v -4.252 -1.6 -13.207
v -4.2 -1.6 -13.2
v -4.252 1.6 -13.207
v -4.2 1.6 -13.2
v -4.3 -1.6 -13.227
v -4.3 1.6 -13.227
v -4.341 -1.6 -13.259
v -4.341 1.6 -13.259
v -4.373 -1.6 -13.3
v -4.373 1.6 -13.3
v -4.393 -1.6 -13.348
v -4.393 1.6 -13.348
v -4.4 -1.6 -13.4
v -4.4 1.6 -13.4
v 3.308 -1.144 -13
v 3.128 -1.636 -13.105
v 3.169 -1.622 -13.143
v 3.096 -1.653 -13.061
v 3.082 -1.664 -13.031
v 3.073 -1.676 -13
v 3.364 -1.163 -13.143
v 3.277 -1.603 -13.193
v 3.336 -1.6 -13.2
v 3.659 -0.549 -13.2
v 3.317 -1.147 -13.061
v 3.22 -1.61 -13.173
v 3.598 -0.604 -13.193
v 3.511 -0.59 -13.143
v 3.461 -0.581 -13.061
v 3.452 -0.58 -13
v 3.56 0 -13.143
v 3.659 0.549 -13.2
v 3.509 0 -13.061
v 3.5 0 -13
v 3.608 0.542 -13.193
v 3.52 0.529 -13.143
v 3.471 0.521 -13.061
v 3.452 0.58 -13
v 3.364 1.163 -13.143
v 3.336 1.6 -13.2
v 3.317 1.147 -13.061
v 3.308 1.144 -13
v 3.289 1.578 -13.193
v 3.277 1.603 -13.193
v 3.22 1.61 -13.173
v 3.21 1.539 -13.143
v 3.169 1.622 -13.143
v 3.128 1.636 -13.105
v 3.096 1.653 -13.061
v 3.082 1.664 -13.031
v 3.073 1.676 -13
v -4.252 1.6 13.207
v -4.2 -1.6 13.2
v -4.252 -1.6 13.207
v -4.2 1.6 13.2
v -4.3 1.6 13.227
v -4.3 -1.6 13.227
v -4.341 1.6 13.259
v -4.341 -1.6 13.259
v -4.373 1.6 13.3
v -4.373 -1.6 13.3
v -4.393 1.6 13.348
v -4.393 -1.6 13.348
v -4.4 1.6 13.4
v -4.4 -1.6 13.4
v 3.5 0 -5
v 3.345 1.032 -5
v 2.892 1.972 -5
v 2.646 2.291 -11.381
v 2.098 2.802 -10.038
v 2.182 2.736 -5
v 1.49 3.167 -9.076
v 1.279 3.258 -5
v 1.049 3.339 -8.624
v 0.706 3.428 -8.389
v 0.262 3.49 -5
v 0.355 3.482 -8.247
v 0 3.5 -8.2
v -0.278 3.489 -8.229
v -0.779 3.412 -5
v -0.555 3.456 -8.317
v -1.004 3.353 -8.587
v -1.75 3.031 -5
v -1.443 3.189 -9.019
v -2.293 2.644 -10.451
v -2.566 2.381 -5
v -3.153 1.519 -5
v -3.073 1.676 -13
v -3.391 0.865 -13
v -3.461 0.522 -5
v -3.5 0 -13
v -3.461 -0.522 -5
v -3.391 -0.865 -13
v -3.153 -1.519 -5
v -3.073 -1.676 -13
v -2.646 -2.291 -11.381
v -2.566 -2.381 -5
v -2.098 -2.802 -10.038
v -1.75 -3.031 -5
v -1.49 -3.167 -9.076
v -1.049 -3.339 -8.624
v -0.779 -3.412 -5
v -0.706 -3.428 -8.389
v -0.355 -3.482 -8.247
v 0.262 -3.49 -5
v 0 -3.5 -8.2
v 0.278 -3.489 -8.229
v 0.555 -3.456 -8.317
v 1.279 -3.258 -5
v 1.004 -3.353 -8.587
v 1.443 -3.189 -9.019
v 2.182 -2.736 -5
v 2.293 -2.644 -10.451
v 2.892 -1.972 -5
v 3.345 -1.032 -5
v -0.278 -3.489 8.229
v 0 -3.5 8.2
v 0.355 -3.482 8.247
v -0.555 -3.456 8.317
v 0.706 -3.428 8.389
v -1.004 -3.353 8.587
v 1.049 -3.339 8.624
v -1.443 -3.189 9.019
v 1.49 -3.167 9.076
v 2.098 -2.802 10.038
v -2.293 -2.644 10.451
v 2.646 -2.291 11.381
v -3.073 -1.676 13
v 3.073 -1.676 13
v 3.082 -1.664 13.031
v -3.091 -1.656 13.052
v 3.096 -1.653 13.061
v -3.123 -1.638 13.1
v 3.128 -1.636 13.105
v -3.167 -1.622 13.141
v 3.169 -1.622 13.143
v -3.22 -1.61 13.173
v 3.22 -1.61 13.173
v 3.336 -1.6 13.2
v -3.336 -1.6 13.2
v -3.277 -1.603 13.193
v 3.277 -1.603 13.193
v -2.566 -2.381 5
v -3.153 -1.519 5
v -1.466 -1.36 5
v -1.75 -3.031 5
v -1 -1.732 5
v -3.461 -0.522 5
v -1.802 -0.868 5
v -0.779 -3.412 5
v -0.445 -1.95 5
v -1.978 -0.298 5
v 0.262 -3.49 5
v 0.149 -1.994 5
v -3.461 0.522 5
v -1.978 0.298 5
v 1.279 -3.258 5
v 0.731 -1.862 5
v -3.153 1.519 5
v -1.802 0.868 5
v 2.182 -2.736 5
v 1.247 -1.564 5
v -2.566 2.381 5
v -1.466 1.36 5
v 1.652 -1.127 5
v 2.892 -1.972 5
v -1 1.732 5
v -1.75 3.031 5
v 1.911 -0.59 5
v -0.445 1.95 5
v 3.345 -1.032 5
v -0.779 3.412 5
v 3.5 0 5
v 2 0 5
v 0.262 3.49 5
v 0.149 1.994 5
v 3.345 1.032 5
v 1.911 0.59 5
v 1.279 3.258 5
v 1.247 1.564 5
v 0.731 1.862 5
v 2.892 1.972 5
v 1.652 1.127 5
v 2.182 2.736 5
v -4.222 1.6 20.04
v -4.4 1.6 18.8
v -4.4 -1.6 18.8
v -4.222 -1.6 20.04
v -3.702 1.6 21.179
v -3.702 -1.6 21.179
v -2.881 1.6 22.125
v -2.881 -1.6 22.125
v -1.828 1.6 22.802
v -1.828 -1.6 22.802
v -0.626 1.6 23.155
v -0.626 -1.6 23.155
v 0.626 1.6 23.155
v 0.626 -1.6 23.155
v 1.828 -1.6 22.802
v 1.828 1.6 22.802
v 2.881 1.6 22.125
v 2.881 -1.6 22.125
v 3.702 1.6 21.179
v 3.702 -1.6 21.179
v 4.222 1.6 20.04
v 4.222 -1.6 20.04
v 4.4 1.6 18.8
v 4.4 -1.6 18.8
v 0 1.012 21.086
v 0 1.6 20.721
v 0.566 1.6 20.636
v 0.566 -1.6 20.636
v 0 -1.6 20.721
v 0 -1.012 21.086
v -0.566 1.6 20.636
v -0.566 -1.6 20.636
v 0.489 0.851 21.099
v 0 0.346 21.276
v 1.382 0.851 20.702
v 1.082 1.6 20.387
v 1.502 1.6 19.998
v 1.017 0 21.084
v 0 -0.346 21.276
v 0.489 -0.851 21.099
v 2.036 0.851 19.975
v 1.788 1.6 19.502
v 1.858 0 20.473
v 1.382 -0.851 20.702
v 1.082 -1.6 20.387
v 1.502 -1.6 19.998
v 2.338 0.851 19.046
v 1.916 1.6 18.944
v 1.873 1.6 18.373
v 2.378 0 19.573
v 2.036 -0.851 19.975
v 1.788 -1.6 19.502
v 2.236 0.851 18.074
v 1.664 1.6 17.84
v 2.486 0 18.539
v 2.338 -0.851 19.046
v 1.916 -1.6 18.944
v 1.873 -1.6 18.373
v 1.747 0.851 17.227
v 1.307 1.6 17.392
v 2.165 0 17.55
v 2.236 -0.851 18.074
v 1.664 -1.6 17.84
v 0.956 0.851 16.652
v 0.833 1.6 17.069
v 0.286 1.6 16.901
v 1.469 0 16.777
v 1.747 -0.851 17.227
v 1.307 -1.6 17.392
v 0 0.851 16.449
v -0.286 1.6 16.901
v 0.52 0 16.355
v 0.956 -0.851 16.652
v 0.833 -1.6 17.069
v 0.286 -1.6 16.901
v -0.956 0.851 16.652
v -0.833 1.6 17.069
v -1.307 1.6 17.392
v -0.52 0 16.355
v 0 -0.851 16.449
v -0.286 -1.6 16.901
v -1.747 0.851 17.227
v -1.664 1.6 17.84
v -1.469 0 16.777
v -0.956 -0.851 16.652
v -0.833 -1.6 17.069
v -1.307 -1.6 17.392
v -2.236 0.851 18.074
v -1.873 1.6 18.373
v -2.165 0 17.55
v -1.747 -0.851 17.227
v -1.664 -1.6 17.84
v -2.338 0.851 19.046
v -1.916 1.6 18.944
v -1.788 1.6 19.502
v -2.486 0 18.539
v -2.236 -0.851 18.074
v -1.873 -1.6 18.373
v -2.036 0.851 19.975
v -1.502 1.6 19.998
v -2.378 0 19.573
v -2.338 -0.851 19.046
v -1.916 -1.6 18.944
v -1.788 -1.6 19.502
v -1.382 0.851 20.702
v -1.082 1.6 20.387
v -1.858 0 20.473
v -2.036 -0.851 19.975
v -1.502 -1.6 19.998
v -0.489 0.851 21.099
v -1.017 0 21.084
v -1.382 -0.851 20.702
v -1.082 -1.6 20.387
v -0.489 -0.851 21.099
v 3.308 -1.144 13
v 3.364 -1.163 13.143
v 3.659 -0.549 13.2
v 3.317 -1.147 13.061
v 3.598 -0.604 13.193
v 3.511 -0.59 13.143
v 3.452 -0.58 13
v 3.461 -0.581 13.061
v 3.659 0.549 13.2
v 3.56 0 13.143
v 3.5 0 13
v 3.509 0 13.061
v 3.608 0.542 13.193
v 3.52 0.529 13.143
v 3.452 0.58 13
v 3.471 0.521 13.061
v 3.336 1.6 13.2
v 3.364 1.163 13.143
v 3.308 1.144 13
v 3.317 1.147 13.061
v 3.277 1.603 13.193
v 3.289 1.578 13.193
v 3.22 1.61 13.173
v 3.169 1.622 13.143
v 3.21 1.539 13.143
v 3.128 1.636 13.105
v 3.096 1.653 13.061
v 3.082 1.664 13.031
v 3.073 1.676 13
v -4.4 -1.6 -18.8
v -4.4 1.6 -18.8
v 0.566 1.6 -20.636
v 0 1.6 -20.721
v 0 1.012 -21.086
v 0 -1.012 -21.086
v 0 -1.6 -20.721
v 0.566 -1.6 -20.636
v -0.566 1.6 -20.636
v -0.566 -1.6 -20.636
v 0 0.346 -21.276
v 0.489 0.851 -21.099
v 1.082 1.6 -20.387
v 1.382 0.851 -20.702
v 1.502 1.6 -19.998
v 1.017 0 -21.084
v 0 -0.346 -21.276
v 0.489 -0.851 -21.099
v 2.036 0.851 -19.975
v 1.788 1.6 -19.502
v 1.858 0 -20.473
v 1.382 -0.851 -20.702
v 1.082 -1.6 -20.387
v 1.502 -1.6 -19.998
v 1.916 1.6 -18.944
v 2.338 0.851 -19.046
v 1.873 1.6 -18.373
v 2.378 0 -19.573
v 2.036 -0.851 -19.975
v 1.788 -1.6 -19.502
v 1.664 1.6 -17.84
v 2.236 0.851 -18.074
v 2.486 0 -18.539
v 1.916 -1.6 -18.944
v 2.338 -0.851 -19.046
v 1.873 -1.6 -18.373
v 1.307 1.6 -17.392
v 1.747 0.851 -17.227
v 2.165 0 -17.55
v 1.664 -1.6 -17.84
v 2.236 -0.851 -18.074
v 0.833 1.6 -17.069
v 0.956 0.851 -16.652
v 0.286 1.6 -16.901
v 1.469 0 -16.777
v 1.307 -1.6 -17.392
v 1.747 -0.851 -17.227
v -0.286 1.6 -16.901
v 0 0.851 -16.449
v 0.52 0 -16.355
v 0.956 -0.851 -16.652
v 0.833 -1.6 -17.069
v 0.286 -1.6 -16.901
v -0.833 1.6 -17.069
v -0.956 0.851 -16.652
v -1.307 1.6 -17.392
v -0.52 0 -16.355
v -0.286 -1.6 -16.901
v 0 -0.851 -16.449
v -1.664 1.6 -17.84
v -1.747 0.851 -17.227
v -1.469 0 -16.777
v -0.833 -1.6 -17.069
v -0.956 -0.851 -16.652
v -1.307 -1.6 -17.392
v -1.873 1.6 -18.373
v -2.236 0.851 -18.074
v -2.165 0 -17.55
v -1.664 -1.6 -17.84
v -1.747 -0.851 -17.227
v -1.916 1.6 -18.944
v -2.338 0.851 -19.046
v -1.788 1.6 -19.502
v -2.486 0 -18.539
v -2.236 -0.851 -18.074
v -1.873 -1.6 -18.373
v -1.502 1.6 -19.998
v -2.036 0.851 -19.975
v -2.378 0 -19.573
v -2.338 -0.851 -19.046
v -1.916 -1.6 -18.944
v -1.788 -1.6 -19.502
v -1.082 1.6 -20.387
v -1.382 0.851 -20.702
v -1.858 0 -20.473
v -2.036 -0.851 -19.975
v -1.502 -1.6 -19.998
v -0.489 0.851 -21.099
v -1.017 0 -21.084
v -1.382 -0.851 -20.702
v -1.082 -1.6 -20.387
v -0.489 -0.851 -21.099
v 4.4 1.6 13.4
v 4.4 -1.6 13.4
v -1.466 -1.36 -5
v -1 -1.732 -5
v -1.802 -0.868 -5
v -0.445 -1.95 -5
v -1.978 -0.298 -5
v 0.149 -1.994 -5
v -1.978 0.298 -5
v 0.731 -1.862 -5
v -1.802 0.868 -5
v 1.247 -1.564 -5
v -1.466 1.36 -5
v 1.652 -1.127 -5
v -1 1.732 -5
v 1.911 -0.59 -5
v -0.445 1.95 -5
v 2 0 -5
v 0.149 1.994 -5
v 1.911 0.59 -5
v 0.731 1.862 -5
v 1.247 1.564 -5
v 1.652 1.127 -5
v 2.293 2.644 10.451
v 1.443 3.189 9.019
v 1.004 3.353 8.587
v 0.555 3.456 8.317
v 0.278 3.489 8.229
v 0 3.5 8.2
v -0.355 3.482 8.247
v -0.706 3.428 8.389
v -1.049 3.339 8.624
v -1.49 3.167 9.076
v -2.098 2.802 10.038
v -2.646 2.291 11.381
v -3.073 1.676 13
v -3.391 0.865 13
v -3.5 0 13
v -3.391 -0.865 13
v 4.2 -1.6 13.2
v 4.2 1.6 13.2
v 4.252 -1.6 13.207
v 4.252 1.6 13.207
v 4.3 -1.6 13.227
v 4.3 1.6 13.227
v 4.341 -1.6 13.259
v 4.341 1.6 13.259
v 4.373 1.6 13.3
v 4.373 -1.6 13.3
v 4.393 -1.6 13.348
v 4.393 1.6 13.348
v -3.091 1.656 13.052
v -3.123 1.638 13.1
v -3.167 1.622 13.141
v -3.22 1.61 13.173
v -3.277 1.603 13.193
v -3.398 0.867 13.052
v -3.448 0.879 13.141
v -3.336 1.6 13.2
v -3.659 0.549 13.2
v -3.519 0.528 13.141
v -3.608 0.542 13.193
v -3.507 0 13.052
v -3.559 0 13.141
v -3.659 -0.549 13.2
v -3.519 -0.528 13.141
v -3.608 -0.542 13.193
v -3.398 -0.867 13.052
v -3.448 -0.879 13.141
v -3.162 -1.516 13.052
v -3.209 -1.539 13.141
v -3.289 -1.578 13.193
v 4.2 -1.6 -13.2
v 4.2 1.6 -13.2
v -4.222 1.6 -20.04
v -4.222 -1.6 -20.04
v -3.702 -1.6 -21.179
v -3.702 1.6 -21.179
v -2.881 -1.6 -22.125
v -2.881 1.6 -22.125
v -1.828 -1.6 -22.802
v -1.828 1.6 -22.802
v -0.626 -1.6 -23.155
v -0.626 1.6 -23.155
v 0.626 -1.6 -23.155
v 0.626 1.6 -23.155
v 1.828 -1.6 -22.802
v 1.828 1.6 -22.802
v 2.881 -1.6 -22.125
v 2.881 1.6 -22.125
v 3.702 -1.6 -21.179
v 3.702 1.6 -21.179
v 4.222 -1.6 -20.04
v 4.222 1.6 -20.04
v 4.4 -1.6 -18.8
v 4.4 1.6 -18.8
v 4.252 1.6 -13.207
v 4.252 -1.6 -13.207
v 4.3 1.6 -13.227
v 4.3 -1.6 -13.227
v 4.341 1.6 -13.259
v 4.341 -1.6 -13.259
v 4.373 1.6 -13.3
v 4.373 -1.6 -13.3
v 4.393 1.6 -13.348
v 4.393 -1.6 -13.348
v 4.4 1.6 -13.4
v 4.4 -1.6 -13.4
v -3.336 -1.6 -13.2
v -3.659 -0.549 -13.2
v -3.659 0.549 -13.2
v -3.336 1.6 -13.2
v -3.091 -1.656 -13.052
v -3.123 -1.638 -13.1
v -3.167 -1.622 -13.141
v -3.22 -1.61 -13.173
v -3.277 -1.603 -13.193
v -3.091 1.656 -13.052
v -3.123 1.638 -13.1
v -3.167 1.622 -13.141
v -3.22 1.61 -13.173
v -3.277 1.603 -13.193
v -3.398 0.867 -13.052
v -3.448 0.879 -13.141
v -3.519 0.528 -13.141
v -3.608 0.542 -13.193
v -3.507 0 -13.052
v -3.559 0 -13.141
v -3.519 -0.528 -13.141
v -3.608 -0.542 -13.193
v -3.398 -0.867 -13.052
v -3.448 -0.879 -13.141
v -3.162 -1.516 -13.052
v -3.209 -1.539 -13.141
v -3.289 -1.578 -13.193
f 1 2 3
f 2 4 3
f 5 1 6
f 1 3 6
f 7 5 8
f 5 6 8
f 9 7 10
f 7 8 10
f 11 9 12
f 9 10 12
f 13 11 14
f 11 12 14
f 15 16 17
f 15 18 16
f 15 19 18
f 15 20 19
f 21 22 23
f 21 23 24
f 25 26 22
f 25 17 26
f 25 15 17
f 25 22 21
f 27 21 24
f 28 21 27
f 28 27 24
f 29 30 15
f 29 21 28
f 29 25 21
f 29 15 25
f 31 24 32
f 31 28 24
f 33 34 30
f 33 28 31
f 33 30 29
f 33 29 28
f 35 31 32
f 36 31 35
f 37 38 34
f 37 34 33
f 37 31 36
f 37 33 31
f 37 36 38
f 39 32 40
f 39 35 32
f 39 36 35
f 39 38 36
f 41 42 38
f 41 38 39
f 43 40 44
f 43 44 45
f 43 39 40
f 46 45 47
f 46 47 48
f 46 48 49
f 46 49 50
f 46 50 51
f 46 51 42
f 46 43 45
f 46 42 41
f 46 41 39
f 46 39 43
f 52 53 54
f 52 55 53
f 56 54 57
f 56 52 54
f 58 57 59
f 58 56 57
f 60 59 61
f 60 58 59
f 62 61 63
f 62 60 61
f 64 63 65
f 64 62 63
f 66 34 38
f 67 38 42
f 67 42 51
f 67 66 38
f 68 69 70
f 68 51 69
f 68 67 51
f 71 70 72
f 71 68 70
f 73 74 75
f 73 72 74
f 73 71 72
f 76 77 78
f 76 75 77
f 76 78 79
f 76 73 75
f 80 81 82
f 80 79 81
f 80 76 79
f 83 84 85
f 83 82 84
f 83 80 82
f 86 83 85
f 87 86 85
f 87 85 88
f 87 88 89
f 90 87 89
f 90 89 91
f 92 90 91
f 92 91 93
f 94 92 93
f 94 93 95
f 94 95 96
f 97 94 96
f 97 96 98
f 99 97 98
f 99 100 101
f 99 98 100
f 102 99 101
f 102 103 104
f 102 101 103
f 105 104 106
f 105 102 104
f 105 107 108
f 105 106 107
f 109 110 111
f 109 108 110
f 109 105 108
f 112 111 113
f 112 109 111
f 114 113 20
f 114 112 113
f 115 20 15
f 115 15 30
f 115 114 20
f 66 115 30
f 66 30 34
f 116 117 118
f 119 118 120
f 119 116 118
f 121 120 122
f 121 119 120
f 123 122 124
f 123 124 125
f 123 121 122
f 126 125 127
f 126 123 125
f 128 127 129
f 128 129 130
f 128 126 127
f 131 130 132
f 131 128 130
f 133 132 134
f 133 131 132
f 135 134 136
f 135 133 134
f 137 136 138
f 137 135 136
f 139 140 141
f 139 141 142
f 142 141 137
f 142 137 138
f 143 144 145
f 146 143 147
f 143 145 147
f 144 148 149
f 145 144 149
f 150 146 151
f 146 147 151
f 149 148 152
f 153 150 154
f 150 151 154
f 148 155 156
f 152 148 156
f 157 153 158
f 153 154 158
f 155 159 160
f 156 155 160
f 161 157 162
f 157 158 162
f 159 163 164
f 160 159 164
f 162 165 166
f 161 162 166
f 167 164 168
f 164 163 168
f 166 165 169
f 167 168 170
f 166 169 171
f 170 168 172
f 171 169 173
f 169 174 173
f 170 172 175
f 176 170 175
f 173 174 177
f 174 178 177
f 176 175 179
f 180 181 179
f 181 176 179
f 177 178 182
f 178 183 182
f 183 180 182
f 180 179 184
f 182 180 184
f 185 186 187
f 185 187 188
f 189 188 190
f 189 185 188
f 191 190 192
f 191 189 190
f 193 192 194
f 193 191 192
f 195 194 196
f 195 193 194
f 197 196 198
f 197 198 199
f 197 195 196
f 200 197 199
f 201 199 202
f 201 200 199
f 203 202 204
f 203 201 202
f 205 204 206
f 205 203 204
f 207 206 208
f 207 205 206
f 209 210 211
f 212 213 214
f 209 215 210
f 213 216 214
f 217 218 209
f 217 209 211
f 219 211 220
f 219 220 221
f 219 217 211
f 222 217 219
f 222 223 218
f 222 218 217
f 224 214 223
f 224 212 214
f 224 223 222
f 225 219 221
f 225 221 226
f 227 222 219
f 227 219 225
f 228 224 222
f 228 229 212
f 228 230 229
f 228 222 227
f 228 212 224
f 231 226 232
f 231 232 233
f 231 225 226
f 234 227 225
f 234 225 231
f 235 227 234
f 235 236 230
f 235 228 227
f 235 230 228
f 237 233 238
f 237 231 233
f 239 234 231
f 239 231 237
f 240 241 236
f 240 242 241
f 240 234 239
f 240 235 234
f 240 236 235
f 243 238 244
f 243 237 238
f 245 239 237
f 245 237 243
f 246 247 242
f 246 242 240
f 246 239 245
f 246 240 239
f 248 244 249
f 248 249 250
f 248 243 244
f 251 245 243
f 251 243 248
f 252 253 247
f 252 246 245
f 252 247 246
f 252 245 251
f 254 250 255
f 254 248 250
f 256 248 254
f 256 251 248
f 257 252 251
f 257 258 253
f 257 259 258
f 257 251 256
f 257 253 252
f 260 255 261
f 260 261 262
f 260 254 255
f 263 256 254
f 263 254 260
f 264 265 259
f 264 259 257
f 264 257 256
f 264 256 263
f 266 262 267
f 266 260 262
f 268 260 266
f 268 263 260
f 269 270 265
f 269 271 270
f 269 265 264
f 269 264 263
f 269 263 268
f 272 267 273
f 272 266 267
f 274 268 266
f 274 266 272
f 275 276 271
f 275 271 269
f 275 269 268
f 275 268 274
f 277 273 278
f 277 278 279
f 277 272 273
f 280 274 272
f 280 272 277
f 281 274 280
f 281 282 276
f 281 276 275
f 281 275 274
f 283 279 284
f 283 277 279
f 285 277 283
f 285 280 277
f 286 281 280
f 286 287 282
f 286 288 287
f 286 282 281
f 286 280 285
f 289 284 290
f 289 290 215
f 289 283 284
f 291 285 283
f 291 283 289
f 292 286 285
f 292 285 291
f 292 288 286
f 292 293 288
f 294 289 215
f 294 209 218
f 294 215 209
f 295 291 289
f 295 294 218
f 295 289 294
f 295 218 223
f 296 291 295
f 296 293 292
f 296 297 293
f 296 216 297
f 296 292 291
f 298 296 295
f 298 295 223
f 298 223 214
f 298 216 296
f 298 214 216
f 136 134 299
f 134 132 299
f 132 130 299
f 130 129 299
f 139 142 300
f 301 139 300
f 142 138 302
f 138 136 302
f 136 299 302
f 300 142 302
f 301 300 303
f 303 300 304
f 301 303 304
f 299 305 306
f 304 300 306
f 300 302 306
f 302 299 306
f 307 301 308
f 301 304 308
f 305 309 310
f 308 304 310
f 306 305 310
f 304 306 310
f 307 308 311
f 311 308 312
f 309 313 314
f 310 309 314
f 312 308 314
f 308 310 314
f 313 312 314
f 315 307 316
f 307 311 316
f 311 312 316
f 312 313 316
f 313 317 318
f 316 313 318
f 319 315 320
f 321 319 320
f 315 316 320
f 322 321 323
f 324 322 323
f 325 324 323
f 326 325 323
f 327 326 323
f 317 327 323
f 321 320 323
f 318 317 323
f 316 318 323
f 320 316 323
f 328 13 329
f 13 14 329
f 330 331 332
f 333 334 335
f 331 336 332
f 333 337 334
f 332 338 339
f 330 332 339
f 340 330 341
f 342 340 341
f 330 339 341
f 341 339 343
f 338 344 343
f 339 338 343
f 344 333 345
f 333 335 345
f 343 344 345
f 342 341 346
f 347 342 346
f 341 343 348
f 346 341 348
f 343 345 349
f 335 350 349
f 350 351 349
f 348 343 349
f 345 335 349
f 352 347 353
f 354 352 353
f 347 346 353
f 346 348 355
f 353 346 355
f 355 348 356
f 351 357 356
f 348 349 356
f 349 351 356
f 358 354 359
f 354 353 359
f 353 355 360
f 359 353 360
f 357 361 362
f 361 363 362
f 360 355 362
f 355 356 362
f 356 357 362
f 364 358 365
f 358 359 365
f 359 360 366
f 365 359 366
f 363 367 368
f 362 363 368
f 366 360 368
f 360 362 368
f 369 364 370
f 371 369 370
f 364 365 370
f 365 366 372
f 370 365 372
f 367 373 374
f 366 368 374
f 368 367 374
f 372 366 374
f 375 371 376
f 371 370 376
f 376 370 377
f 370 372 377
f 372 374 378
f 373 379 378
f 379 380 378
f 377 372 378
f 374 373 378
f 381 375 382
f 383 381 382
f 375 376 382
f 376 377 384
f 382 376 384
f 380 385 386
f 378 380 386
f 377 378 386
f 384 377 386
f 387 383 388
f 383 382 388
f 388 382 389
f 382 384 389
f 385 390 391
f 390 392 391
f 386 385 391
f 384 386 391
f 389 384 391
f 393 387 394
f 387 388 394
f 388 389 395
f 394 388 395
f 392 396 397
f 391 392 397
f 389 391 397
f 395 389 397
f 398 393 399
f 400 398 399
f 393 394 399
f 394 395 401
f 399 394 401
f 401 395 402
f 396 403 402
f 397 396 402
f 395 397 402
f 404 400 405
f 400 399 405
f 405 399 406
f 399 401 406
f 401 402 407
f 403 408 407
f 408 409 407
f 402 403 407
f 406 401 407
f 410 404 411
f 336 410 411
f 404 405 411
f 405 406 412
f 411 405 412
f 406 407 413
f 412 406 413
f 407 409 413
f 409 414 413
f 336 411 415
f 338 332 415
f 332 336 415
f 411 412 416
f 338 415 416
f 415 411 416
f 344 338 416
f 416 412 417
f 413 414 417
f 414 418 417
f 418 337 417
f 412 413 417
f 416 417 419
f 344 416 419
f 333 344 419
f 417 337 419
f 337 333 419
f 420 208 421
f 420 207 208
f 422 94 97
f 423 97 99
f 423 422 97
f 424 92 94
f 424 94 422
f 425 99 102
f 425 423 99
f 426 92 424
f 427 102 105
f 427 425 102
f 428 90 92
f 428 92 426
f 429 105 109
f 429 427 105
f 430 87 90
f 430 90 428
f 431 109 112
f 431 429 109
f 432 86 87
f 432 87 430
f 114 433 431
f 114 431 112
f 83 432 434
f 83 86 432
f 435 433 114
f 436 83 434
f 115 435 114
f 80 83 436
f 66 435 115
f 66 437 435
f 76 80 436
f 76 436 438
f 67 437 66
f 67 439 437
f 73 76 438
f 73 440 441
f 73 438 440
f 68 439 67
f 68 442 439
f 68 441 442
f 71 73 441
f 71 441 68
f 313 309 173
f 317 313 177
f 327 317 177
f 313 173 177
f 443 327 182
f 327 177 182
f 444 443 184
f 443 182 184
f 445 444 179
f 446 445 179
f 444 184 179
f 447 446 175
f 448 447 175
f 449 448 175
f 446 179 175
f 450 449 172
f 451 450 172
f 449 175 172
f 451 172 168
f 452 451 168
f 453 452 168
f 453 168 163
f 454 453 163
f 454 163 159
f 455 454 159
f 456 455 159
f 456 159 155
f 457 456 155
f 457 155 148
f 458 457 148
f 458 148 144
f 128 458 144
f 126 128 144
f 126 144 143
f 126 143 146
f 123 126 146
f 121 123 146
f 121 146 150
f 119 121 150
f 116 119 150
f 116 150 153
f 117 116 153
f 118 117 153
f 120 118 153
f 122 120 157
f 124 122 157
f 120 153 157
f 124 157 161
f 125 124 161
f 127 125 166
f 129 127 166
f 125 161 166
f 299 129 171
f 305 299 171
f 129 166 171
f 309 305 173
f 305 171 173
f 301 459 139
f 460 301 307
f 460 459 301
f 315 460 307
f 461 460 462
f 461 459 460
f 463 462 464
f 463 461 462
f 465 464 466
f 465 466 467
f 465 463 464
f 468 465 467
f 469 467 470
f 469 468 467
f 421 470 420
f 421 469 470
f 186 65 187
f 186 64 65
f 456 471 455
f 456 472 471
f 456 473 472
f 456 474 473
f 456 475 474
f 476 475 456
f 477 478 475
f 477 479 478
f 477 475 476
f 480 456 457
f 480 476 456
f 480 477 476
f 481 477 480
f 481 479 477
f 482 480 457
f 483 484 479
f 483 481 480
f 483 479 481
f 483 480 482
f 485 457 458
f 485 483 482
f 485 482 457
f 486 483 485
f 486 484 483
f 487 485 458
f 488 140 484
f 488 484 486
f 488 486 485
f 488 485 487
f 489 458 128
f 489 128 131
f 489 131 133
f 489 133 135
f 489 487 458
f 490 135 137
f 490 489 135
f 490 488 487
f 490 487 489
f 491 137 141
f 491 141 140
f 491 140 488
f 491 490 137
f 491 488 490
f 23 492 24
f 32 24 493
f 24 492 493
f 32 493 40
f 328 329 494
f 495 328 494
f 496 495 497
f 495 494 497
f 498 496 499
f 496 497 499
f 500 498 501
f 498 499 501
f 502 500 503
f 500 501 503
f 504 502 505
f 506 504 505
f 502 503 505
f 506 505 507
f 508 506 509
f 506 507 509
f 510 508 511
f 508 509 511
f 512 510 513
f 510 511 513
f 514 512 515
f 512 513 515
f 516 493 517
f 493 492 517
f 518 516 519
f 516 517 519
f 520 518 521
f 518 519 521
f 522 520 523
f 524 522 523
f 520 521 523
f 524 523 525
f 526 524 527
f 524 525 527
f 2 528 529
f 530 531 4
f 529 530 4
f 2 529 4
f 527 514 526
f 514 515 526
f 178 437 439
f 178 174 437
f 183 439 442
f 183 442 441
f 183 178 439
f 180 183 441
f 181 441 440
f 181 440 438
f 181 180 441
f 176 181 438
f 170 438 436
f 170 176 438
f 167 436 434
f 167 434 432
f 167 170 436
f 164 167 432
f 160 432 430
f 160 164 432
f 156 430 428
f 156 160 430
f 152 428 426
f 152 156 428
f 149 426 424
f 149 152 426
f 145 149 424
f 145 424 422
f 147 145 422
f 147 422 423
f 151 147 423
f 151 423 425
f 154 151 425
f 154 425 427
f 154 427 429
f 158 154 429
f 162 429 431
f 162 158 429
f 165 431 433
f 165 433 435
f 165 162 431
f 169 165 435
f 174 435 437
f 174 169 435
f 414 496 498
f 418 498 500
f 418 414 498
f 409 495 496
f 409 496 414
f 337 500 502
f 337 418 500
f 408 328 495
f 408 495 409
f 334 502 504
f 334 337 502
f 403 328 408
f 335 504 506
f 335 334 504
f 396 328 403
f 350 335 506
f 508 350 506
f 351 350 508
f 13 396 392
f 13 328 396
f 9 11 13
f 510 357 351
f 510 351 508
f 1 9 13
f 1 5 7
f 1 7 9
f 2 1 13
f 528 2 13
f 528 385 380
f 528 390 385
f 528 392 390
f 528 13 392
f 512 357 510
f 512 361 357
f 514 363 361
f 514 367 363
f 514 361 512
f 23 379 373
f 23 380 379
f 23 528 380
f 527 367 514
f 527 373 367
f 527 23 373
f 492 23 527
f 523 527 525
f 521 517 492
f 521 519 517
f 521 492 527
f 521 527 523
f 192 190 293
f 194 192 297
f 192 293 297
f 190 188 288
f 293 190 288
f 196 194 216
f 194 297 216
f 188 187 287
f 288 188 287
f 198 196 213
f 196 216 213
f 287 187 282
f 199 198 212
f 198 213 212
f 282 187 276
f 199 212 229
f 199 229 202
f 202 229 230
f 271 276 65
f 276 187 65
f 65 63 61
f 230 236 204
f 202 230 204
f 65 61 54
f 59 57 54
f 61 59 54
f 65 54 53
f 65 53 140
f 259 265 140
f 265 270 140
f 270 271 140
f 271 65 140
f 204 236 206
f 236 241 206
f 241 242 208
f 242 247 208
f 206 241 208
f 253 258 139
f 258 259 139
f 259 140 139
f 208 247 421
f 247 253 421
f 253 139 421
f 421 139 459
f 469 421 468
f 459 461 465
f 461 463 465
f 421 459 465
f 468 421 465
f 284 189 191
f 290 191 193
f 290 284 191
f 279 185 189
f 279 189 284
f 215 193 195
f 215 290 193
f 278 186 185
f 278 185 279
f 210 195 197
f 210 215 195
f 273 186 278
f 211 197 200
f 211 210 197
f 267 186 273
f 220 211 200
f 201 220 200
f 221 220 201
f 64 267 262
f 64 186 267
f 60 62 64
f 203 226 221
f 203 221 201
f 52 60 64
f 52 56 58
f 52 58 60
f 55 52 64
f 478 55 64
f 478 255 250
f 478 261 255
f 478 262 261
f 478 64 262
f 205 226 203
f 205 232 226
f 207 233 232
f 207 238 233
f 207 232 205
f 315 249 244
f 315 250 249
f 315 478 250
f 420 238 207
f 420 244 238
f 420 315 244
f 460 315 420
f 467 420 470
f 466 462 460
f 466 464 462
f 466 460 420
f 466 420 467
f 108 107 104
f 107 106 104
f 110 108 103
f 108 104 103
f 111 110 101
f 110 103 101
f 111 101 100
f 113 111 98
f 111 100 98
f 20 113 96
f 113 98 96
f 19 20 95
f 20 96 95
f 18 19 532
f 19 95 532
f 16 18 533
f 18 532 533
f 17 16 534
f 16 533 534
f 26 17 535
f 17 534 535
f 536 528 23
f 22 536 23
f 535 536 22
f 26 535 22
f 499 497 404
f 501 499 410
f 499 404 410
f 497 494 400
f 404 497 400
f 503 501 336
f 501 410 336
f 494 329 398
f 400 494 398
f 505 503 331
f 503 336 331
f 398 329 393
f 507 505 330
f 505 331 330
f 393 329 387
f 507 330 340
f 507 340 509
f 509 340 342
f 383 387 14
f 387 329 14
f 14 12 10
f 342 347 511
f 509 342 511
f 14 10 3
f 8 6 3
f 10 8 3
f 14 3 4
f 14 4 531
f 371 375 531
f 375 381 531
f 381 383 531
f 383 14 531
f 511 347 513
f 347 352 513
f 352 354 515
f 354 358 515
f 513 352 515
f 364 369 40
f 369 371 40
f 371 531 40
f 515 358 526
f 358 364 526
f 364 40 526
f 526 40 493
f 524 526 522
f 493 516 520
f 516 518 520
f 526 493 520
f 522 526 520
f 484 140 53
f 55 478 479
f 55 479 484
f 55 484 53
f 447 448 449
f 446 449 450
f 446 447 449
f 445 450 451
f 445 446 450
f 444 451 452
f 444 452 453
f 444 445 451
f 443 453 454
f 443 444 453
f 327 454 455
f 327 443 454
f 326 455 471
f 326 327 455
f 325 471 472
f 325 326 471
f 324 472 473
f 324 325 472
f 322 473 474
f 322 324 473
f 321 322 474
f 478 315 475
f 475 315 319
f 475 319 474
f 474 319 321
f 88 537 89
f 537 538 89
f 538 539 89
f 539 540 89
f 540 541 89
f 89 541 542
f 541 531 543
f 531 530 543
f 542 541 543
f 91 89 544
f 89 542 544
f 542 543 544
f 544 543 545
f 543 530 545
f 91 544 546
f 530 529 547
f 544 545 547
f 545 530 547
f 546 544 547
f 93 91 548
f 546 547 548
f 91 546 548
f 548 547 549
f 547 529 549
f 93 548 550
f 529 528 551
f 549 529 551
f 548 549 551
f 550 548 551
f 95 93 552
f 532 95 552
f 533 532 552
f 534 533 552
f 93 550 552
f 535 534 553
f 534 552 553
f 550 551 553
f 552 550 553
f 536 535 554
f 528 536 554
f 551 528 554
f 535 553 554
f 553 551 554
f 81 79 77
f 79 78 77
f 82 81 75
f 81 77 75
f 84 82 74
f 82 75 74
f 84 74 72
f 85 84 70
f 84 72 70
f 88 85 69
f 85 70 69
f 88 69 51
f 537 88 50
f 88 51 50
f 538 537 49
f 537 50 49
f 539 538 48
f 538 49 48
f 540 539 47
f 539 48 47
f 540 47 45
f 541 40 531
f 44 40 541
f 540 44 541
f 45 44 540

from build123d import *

# Parameters (mm, degrees)
SKETCH1_R                  = 2
SCREW_SECTION_DEPTH        = 5
SKETCH2_R                  = 3.5
BAR_SECTION_DEPTH          = 8.2
MOUNT_SECTION_DEPTH        = 1.6
BAR_TAPER_DEPTH            = 5.4
MOUNT_FILLET_R             = 0.2
MOUNT_FILLET_OF_MIRROR_2_R = 0.2


with BuildPart() as part:
    # Sketch1 → Screw Section (new body)
    with BuildSketch(Plane.XY):
        Circle(SKETCH1_R)
    screw_section = extrude(amount=SCREW_SECTION_DEPTH)

    # Sketch2 → Bar Section (add)
    with BuildSketch(Plane.XY.offset(5)):
        Circle(SKETCH2_R)
    bar_section = extrude(amount=BAR_SECTION_DEPTH)

    # Sketch3 → Mount Section (add, symmetric)
    with BuildSketch(Plane(origin=(0, 0, 0), x_dir=(1, 0, 0), z_dir=(0, 1, 0))):
        with BuildLine():
            Line((4.4, -13.2), (-4.4, -13.2))
            Line((-4.4, -13.2), (-4.4, -18.8))
            ThreePointArc((-4.4, -18.8), (0, -23.2), (4.4, -18.8))
            Line((4.4, -18.8), (4.4, -13.2))
        make_face()
    mount_section = extrude(amount=MOUNT_SECTION_DEPTH, both=True)

    # Sketch4 → Bar Taper (cut, symmetric)
    with BuildSketch(Plane(origin=(0, 0, 0), x_dir=(0, 0, -1), z_dir=(1, 0, 0))):
        Polygon((-8.2, -3.5), (-13.2, -1.6), (-13.2, -3.5), align=None)
        Polygon((-8.2, 3.5), (-13.2, 1.6), (-13.2, 3.5), align=None)
    bar_taper = extrude(amount=BAR_TAPER_DEPTH, both=True, mode=Mode.SUBTRACT)

    # Mount Fillet
    mount_fillet_edges = [part.edges().sort_by_distance(p)[0] for p in [
        (-4.4, 0, 13.2),
        (3.401842713, -0.823083322, 13.2),
        (-3.5, 0, 13.2),
        (4.4, 0, 13.2),
    ]]
    fillet(mount_fillet_edges, radius=MOUNT_FILLET_R)

    # Sketch6 → Ball Hole (revolve, cut)
    with BuildSketch(Plane(origin=(0, 0, 0), x_dir=(0, 0, -1), z_dir=(1, 0, 0))):
        with BuildLine():
            Line((-20.720937271, -1.6), (-18.8, -1.6))
            Line((-18.8, -1.6), (-18.8, 1.6))
            Line((-18.8, 1.6), (-20.720937271, 1.6))
            ThreePointArc((-20.720937271, 1.6), (-21.3, 0), (-20.720937271, -1.6))
        make_face()
    ball_hole = revolve(axis=Axis((0, -1.6, 18.8), (0, 1, 0)), mode=Mode.SUBTRACT)

    # Mirror 2: Screw Section, Bar Section, Mount Section, Bar Taper, Ball Hole across Front Plane
    add(screw_section.mirror(Plane.XY))
    add(bar_section.mirror(Plane.XY))
    add(mount_section.mirror(Plane.XY))
    add(bar_taper.mirror(Plane.XY), mode=Mode.SUBTRACT)
    add(ball_hole.mirror(Plane.XY), mode=Mode.SUBTRACT)

    # Mount Fillet of Mirror 2
    mount_fillet_of_mirror_2_edges = [part.edges().sort_by_distance(p)[0] for p in [
        (-4.4, 0, -13.2),
        (3.401842713, -0.823083322, -13.2),
        (-3.5, 0, -13.2),
        (4.4, 0, -13.2),
    ]]
    fillet(mount_fillet_of_mirror_2_edges, radius=MOUNT_FILLET_OF_MIRROR_2_R)


solid = part.part
